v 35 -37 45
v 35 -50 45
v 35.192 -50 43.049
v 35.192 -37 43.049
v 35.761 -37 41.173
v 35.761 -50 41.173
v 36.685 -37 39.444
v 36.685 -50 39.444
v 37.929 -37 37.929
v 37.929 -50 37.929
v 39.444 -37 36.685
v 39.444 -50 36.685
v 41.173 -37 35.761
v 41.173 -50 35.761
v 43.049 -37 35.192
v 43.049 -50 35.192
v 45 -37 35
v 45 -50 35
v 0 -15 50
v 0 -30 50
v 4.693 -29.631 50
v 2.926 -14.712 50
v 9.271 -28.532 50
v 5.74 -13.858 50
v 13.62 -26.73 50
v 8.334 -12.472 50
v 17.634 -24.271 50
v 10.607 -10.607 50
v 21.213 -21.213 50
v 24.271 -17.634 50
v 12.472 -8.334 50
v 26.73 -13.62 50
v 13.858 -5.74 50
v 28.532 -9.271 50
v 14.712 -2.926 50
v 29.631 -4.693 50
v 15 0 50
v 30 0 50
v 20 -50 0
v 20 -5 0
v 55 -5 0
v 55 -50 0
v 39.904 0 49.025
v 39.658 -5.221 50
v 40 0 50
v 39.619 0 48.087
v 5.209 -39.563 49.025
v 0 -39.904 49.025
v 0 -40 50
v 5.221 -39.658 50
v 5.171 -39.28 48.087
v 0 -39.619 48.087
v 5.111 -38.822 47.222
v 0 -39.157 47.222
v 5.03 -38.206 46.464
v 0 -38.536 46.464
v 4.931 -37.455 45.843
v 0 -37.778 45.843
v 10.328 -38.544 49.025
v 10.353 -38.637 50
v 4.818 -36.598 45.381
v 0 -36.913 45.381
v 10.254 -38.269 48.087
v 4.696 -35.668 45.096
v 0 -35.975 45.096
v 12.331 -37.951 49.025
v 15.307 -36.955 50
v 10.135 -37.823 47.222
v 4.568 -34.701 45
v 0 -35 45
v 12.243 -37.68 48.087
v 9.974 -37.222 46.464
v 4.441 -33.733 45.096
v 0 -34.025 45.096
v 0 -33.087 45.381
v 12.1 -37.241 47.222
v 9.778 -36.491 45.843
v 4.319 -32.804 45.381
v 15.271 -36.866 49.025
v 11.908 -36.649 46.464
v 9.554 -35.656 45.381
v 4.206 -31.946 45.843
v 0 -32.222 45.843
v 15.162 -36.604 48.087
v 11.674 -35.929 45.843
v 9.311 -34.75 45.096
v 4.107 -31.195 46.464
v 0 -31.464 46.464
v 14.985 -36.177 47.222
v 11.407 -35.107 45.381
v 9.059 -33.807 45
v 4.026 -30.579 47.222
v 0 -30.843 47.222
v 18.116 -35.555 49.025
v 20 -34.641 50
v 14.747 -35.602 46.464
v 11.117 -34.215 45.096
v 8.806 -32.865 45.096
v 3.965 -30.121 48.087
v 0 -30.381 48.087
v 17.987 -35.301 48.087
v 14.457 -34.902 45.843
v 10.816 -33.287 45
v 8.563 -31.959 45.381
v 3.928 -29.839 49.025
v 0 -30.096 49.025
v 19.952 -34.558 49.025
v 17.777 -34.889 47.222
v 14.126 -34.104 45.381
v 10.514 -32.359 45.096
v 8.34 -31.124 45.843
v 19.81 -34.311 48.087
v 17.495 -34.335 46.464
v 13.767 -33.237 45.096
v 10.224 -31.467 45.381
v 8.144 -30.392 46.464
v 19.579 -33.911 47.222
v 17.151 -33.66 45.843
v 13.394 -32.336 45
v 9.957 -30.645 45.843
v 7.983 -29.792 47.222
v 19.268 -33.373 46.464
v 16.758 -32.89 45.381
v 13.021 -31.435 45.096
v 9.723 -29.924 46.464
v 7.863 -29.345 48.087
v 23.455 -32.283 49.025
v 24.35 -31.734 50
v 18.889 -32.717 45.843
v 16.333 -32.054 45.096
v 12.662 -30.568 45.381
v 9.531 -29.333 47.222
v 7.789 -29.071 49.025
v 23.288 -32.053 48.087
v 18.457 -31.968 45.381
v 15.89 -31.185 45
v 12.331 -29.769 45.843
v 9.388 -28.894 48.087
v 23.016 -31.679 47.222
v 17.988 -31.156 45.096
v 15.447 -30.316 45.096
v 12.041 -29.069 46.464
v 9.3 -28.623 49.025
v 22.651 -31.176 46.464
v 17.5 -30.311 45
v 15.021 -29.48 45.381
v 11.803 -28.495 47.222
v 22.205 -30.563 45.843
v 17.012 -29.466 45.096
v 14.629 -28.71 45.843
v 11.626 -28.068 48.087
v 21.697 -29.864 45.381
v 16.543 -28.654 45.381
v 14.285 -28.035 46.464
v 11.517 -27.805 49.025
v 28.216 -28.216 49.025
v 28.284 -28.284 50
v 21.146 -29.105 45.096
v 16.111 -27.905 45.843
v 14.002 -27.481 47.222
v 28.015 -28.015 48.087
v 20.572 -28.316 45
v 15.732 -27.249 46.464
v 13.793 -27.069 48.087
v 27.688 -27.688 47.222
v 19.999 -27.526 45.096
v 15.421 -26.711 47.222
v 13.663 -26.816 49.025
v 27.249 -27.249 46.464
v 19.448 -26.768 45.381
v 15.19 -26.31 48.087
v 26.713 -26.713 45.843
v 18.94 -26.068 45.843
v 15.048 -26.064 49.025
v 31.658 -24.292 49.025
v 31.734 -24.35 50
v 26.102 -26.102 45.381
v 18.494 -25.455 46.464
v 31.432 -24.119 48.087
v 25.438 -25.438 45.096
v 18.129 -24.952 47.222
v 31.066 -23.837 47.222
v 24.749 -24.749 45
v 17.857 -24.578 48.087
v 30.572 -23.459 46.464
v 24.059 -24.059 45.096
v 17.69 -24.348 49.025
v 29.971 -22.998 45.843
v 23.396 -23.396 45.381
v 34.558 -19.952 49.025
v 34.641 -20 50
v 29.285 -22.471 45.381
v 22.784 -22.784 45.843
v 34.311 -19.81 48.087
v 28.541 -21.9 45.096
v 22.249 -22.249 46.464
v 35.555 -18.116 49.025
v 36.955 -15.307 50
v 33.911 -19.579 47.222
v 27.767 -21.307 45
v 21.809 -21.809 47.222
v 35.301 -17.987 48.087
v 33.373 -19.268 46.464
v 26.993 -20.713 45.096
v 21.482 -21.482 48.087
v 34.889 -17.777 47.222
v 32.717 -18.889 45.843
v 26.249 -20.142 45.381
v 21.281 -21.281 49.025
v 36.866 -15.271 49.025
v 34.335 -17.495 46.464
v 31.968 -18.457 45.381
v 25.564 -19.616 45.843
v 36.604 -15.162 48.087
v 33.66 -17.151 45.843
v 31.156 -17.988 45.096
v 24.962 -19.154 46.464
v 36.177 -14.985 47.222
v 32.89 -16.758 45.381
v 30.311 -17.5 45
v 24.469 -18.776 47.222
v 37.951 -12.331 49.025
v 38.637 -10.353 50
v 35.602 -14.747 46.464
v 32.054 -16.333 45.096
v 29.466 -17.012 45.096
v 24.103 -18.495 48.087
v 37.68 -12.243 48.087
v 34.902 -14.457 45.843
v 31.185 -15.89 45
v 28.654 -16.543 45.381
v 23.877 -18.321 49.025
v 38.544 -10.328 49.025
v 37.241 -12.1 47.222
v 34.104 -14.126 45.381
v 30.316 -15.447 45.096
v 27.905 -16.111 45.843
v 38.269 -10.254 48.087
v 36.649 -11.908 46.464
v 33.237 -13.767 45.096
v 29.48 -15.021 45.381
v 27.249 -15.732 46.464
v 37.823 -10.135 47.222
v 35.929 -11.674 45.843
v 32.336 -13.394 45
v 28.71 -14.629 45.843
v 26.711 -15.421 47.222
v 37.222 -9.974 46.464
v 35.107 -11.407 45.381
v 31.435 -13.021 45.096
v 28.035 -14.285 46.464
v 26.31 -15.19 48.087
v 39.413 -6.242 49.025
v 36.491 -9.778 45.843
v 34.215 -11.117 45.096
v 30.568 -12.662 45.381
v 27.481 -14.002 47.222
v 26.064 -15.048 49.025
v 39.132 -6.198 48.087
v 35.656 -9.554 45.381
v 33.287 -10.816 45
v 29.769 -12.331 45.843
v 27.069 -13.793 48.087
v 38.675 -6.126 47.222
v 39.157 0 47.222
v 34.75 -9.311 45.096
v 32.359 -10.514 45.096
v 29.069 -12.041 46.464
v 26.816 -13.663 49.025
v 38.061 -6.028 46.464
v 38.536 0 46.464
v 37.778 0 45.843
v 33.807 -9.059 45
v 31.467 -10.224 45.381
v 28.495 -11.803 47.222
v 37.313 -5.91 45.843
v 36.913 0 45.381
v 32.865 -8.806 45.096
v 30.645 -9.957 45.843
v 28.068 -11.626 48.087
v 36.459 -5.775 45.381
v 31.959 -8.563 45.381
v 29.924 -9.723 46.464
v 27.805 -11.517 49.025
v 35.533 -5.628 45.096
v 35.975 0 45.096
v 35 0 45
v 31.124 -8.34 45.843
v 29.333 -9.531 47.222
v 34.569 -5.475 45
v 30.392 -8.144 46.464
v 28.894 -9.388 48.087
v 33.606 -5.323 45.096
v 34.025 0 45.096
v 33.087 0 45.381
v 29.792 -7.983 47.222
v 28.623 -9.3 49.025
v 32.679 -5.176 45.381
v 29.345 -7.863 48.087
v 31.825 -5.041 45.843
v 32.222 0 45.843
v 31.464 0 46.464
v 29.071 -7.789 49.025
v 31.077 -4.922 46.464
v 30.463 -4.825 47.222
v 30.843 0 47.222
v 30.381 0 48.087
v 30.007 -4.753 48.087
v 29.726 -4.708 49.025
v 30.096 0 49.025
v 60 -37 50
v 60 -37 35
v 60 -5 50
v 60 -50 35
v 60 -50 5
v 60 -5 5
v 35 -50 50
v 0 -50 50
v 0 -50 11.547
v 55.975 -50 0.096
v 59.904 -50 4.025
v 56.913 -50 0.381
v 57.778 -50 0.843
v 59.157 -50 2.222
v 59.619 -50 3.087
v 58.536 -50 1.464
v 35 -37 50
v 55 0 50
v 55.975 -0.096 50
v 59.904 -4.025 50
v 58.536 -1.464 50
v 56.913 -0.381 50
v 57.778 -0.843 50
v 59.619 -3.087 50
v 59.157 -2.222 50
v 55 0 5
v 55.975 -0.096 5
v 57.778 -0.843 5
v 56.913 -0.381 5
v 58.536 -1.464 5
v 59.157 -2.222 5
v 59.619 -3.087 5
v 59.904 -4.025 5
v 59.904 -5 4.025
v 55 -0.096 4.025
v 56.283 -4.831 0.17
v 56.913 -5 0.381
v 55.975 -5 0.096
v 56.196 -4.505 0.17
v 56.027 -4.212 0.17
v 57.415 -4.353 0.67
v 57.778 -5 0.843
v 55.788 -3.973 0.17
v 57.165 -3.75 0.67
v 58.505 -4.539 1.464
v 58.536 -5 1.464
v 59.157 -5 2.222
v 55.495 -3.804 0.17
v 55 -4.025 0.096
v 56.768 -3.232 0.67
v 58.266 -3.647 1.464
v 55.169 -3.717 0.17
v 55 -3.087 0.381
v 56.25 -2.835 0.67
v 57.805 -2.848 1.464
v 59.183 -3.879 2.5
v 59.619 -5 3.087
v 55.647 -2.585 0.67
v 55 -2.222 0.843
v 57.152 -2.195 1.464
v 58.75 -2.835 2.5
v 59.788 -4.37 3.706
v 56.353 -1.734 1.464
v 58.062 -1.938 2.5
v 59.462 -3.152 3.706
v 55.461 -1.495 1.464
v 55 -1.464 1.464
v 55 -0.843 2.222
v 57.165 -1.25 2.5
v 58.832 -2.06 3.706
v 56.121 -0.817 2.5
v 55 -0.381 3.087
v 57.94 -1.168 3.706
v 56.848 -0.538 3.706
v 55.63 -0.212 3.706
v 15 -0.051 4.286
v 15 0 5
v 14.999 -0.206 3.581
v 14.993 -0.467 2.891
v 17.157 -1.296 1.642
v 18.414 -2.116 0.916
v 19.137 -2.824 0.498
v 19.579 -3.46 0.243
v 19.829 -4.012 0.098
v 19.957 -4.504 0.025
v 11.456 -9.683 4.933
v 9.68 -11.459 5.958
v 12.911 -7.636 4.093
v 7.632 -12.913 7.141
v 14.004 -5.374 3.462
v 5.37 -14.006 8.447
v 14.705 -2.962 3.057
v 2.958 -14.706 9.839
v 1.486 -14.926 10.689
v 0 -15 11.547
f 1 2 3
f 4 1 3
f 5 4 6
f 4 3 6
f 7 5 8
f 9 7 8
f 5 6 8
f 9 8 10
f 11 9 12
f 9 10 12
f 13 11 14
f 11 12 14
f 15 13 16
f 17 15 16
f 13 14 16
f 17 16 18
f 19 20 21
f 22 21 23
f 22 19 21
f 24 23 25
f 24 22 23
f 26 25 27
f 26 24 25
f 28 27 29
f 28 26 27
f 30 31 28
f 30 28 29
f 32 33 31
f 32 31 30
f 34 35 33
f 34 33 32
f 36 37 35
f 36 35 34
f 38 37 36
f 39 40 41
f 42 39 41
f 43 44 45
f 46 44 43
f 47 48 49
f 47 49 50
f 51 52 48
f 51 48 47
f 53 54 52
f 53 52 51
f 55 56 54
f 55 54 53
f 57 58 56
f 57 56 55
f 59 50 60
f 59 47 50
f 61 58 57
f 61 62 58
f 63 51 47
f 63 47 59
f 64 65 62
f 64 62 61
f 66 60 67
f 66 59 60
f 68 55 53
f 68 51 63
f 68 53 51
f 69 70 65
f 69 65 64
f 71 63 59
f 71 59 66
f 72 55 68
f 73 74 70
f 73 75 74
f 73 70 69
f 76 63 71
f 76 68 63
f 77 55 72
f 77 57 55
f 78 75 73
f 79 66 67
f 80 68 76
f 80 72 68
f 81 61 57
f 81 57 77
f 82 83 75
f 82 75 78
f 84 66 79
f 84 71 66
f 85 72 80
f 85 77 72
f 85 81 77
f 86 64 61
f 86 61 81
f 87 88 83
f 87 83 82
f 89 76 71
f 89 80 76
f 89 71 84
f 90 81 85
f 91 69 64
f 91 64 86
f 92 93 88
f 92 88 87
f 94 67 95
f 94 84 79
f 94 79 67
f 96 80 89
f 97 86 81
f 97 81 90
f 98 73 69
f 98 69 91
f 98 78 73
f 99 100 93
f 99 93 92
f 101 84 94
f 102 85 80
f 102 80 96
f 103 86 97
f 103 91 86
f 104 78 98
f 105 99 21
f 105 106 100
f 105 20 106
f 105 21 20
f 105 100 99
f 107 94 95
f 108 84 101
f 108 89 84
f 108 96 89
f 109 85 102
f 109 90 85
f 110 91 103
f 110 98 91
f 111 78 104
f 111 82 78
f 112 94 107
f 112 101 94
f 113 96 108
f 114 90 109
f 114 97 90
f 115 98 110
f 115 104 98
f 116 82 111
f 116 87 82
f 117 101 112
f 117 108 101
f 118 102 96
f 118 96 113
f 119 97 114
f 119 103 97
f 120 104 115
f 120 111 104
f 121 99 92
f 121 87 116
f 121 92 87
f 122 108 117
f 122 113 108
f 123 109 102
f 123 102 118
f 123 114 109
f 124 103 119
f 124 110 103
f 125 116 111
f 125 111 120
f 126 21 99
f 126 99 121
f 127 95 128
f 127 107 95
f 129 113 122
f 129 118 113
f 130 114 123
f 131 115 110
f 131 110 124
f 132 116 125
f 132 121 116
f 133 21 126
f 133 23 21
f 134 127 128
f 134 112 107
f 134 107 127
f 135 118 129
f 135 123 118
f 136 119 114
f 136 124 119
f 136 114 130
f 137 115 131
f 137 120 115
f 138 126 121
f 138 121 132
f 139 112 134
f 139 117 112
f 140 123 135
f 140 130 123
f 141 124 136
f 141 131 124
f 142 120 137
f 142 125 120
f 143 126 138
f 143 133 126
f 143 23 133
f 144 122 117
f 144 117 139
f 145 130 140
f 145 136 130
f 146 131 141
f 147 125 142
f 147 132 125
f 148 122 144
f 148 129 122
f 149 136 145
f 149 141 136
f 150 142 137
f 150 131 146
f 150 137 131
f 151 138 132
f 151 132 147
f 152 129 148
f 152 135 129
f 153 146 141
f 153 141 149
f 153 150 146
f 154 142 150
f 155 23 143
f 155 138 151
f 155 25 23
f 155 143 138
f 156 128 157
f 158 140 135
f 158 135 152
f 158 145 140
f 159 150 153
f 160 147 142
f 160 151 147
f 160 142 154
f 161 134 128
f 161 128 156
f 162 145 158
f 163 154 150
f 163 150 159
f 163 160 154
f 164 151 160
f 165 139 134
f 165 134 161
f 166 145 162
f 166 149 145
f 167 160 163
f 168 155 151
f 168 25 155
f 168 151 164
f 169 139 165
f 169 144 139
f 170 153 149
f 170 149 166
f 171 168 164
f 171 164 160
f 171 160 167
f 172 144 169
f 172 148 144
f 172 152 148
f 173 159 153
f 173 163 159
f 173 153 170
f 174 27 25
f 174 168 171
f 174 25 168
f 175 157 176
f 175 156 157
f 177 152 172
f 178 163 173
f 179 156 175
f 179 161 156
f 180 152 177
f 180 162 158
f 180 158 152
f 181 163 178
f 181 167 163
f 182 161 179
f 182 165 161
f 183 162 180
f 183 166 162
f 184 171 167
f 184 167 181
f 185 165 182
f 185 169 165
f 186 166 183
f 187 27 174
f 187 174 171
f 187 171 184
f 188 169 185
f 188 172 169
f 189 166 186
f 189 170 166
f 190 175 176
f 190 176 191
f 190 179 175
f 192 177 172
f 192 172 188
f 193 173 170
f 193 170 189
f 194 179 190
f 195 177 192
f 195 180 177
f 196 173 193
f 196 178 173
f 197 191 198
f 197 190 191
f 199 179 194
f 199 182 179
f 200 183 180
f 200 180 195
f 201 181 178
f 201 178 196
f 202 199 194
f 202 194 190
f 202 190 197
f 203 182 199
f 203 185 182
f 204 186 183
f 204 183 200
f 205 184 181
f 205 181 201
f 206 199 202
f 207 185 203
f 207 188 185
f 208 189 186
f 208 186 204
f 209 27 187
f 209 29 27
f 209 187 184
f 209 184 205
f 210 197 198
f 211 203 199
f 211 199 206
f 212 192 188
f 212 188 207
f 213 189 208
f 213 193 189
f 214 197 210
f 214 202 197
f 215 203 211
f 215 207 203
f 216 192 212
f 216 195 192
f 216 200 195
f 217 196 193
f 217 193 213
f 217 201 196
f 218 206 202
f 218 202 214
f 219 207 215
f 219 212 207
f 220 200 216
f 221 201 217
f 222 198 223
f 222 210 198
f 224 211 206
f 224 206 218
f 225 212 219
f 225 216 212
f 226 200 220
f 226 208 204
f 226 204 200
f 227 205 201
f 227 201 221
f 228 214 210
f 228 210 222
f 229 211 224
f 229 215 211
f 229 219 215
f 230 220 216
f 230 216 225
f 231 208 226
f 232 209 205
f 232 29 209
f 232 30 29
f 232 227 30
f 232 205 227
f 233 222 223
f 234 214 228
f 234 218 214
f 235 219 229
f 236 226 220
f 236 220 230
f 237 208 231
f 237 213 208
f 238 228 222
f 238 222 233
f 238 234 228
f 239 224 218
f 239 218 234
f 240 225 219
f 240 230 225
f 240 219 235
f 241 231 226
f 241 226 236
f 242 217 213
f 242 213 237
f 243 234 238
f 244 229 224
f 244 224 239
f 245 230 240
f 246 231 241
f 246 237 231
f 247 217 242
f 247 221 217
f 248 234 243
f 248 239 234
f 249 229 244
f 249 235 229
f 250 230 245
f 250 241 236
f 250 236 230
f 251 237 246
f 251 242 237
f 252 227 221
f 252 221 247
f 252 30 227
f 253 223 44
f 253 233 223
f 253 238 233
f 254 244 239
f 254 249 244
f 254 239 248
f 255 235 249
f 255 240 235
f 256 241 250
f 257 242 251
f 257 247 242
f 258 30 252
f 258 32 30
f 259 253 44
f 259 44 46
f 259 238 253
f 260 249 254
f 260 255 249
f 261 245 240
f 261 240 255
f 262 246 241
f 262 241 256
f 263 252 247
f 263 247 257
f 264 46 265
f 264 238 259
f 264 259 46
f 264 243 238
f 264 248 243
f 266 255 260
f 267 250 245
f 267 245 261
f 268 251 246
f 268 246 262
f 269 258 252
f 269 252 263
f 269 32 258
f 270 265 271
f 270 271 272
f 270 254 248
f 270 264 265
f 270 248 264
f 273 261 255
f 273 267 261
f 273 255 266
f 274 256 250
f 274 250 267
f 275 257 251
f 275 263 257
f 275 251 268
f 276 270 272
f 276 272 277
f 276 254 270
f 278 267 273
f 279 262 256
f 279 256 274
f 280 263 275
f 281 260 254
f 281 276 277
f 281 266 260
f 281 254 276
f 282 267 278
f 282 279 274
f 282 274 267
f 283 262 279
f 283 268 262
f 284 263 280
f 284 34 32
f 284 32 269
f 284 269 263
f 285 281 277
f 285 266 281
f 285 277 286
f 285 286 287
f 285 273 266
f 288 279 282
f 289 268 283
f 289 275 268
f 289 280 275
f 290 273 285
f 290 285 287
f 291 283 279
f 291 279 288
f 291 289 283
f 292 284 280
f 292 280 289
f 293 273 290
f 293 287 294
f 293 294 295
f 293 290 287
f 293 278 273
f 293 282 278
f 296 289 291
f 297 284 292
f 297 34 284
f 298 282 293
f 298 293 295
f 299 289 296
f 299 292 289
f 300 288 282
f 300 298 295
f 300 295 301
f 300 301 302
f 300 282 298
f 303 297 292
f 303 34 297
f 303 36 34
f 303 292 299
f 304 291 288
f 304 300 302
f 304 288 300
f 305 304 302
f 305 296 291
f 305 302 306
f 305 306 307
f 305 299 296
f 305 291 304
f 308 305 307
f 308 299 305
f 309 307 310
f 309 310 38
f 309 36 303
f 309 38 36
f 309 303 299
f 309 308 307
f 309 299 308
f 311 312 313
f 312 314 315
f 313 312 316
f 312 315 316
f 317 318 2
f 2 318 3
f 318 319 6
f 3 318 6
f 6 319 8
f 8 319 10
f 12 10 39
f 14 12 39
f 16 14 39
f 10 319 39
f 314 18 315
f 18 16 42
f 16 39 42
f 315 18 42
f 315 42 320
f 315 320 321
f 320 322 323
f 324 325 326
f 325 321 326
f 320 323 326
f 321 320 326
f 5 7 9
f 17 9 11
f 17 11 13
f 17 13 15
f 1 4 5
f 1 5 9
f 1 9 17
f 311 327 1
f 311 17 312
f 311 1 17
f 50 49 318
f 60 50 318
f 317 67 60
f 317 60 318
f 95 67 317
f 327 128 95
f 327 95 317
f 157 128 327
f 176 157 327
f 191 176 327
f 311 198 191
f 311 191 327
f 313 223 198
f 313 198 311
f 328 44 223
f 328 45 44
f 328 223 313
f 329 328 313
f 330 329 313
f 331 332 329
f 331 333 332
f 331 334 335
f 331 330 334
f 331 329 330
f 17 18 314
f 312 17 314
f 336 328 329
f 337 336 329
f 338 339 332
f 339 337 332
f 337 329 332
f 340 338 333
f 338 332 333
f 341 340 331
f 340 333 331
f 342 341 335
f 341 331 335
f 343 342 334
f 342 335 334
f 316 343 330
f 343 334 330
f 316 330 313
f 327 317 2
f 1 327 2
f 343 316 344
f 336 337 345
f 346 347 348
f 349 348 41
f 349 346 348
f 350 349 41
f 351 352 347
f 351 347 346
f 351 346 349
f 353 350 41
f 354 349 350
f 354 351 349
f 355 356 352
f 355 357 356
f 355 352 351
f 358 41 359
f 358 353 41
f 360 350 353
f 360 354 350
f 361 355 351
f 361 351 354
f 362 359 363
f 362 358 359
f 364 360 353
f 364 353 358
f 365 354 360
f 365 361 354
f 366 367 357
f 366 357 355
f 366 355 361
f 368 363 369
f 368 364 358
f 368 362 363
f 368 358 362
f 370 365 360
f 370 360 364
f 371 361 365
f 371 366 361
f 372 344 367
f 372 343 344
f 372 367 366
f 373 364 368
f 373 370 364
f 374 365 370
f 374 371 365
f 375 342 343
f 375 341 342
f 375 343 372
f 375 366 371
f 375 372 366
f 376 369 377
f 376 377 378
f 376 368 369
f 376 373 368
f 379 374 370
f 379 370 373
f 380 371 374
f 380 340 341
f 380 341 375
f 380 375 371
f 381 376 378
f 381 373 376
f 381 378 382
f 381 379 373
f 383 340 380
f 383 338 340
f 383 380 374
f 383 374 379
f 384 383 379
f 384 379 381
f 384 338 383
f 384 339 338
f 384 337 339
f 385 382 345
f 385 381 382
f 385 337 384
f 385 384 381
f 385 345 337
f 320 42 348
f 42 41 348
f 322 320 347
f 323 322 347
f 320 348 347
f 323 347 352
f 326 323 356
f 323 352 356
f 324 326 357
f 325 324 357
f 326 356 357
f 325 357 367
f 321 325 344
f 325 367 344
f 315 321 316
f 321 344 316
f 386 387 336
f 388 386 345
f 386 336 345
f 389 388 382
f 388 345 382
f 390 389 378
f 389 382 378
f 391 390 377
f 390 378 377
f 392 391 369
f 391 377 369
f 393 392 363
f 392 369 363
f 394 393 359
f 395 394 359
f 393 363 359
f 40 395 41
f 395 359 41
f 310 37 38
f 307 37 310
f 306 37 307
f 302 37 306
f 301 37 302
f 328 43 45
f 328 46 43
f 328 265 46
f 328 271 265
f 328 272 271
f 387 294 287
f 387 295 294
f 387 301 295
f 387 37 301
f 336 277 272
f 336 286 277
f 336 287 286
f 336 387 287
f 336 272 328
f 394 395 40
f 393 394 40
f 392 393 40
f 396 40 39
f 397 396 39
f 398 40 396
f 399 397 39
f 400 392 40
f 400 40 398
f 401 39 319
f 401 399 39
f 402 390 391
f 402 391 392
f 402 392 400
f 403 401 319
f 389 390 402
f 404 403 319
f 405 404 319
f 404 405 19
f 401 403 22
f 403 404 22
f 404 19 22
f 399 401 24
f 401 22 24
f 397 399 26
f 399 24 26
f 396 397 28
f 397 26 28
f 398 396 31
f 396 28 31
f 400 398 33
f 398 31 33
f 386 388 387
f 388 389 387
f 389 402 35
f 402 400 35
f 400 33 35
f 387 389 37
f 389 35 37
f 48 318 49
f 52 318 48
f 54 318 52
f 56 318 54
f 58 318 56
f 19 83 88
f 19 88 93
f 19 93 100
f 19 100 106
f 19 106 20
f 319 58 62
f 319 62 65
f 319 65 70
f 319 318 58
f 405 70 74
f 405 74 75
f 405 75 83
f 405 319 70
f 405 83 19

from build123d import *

# Parameters (mm, degrees)
F0_W        = 60
F0_H        = 50
F1_DEPTH    = 50
F2_W        = 15
F2_H        = 50
F5_DEPTH    = 13
F6_T1_DEPTH = 138.4834301858
F7_R        = 5


# Not quite as in the source:
# - a fillet or chamfer that OpenCascade refuses, or shapes differently, is made with other operations: its cross-section is extruded or revolved along the edge and cut away or added


with BuildPart() as f1:
    # F0 (on Top) → F1 (new body)
    with BuildSketch(Plane.XY):
        with Locations((30, -25)):
            Rectangle(F0_W, F0_H)
    extrude(amount=F1_DEPTH)

    # F2 (on Right) → F3 (revolve, cut)
    with BuildSketch(Plane.YZ):
        with Locations((-7.5, 25)):
            Rectangle(F2_W, F2_H)
        with BuildLine():
            Line((-30, 50), (-40, 50))
            ThreePointArc((-40, 50), (-35, 45), (-30, 50))
        make_face()
    revolve(axis=Axis((0, 0, 25), (0, 0, 1)), mode=Mode.SUBTRACT)

    # F4 (on face) → F5 (cut)
    with BuildSketch(Plane.XZ.offset(50)):
        with BuildLine():
            Line((60, 50), (35, 50))
            Line((35, 50), (35, 45))
            ThreePointArc((35, 45), (37.9289321881, 37.9289321881), (45, 35))
            Line((45, 35), (60, 35))
            Line((60, 35), (60, 50))
        make_face()
    extrude(amount=-F5_DEPTH, mode=Mode.SUBTRACT)

    # F6: chamfer of 20 x 11.5470053838 on 1 edges, made by hand

    # F6_s2 → F6_t1 (cut)
    with BuildSketch(Plane.XZ.offset(-36.7417150929)):
        Polygon((20, 0), (0, 11.5470053838), (0, 0), align=None)
    extrude(amount=F6_T1_DEPTH, mode=Mode.SUBTRACT)

    # F7
    f7_edges = [f1.edges().sort_by_distance(p)[0] for p in [
        (60, 0, 25),
        (60, -25, 0),
        (40, 0, 0),
    ]]
    fillet(f7_edges, radius=F7_R)


solid = f1.part
